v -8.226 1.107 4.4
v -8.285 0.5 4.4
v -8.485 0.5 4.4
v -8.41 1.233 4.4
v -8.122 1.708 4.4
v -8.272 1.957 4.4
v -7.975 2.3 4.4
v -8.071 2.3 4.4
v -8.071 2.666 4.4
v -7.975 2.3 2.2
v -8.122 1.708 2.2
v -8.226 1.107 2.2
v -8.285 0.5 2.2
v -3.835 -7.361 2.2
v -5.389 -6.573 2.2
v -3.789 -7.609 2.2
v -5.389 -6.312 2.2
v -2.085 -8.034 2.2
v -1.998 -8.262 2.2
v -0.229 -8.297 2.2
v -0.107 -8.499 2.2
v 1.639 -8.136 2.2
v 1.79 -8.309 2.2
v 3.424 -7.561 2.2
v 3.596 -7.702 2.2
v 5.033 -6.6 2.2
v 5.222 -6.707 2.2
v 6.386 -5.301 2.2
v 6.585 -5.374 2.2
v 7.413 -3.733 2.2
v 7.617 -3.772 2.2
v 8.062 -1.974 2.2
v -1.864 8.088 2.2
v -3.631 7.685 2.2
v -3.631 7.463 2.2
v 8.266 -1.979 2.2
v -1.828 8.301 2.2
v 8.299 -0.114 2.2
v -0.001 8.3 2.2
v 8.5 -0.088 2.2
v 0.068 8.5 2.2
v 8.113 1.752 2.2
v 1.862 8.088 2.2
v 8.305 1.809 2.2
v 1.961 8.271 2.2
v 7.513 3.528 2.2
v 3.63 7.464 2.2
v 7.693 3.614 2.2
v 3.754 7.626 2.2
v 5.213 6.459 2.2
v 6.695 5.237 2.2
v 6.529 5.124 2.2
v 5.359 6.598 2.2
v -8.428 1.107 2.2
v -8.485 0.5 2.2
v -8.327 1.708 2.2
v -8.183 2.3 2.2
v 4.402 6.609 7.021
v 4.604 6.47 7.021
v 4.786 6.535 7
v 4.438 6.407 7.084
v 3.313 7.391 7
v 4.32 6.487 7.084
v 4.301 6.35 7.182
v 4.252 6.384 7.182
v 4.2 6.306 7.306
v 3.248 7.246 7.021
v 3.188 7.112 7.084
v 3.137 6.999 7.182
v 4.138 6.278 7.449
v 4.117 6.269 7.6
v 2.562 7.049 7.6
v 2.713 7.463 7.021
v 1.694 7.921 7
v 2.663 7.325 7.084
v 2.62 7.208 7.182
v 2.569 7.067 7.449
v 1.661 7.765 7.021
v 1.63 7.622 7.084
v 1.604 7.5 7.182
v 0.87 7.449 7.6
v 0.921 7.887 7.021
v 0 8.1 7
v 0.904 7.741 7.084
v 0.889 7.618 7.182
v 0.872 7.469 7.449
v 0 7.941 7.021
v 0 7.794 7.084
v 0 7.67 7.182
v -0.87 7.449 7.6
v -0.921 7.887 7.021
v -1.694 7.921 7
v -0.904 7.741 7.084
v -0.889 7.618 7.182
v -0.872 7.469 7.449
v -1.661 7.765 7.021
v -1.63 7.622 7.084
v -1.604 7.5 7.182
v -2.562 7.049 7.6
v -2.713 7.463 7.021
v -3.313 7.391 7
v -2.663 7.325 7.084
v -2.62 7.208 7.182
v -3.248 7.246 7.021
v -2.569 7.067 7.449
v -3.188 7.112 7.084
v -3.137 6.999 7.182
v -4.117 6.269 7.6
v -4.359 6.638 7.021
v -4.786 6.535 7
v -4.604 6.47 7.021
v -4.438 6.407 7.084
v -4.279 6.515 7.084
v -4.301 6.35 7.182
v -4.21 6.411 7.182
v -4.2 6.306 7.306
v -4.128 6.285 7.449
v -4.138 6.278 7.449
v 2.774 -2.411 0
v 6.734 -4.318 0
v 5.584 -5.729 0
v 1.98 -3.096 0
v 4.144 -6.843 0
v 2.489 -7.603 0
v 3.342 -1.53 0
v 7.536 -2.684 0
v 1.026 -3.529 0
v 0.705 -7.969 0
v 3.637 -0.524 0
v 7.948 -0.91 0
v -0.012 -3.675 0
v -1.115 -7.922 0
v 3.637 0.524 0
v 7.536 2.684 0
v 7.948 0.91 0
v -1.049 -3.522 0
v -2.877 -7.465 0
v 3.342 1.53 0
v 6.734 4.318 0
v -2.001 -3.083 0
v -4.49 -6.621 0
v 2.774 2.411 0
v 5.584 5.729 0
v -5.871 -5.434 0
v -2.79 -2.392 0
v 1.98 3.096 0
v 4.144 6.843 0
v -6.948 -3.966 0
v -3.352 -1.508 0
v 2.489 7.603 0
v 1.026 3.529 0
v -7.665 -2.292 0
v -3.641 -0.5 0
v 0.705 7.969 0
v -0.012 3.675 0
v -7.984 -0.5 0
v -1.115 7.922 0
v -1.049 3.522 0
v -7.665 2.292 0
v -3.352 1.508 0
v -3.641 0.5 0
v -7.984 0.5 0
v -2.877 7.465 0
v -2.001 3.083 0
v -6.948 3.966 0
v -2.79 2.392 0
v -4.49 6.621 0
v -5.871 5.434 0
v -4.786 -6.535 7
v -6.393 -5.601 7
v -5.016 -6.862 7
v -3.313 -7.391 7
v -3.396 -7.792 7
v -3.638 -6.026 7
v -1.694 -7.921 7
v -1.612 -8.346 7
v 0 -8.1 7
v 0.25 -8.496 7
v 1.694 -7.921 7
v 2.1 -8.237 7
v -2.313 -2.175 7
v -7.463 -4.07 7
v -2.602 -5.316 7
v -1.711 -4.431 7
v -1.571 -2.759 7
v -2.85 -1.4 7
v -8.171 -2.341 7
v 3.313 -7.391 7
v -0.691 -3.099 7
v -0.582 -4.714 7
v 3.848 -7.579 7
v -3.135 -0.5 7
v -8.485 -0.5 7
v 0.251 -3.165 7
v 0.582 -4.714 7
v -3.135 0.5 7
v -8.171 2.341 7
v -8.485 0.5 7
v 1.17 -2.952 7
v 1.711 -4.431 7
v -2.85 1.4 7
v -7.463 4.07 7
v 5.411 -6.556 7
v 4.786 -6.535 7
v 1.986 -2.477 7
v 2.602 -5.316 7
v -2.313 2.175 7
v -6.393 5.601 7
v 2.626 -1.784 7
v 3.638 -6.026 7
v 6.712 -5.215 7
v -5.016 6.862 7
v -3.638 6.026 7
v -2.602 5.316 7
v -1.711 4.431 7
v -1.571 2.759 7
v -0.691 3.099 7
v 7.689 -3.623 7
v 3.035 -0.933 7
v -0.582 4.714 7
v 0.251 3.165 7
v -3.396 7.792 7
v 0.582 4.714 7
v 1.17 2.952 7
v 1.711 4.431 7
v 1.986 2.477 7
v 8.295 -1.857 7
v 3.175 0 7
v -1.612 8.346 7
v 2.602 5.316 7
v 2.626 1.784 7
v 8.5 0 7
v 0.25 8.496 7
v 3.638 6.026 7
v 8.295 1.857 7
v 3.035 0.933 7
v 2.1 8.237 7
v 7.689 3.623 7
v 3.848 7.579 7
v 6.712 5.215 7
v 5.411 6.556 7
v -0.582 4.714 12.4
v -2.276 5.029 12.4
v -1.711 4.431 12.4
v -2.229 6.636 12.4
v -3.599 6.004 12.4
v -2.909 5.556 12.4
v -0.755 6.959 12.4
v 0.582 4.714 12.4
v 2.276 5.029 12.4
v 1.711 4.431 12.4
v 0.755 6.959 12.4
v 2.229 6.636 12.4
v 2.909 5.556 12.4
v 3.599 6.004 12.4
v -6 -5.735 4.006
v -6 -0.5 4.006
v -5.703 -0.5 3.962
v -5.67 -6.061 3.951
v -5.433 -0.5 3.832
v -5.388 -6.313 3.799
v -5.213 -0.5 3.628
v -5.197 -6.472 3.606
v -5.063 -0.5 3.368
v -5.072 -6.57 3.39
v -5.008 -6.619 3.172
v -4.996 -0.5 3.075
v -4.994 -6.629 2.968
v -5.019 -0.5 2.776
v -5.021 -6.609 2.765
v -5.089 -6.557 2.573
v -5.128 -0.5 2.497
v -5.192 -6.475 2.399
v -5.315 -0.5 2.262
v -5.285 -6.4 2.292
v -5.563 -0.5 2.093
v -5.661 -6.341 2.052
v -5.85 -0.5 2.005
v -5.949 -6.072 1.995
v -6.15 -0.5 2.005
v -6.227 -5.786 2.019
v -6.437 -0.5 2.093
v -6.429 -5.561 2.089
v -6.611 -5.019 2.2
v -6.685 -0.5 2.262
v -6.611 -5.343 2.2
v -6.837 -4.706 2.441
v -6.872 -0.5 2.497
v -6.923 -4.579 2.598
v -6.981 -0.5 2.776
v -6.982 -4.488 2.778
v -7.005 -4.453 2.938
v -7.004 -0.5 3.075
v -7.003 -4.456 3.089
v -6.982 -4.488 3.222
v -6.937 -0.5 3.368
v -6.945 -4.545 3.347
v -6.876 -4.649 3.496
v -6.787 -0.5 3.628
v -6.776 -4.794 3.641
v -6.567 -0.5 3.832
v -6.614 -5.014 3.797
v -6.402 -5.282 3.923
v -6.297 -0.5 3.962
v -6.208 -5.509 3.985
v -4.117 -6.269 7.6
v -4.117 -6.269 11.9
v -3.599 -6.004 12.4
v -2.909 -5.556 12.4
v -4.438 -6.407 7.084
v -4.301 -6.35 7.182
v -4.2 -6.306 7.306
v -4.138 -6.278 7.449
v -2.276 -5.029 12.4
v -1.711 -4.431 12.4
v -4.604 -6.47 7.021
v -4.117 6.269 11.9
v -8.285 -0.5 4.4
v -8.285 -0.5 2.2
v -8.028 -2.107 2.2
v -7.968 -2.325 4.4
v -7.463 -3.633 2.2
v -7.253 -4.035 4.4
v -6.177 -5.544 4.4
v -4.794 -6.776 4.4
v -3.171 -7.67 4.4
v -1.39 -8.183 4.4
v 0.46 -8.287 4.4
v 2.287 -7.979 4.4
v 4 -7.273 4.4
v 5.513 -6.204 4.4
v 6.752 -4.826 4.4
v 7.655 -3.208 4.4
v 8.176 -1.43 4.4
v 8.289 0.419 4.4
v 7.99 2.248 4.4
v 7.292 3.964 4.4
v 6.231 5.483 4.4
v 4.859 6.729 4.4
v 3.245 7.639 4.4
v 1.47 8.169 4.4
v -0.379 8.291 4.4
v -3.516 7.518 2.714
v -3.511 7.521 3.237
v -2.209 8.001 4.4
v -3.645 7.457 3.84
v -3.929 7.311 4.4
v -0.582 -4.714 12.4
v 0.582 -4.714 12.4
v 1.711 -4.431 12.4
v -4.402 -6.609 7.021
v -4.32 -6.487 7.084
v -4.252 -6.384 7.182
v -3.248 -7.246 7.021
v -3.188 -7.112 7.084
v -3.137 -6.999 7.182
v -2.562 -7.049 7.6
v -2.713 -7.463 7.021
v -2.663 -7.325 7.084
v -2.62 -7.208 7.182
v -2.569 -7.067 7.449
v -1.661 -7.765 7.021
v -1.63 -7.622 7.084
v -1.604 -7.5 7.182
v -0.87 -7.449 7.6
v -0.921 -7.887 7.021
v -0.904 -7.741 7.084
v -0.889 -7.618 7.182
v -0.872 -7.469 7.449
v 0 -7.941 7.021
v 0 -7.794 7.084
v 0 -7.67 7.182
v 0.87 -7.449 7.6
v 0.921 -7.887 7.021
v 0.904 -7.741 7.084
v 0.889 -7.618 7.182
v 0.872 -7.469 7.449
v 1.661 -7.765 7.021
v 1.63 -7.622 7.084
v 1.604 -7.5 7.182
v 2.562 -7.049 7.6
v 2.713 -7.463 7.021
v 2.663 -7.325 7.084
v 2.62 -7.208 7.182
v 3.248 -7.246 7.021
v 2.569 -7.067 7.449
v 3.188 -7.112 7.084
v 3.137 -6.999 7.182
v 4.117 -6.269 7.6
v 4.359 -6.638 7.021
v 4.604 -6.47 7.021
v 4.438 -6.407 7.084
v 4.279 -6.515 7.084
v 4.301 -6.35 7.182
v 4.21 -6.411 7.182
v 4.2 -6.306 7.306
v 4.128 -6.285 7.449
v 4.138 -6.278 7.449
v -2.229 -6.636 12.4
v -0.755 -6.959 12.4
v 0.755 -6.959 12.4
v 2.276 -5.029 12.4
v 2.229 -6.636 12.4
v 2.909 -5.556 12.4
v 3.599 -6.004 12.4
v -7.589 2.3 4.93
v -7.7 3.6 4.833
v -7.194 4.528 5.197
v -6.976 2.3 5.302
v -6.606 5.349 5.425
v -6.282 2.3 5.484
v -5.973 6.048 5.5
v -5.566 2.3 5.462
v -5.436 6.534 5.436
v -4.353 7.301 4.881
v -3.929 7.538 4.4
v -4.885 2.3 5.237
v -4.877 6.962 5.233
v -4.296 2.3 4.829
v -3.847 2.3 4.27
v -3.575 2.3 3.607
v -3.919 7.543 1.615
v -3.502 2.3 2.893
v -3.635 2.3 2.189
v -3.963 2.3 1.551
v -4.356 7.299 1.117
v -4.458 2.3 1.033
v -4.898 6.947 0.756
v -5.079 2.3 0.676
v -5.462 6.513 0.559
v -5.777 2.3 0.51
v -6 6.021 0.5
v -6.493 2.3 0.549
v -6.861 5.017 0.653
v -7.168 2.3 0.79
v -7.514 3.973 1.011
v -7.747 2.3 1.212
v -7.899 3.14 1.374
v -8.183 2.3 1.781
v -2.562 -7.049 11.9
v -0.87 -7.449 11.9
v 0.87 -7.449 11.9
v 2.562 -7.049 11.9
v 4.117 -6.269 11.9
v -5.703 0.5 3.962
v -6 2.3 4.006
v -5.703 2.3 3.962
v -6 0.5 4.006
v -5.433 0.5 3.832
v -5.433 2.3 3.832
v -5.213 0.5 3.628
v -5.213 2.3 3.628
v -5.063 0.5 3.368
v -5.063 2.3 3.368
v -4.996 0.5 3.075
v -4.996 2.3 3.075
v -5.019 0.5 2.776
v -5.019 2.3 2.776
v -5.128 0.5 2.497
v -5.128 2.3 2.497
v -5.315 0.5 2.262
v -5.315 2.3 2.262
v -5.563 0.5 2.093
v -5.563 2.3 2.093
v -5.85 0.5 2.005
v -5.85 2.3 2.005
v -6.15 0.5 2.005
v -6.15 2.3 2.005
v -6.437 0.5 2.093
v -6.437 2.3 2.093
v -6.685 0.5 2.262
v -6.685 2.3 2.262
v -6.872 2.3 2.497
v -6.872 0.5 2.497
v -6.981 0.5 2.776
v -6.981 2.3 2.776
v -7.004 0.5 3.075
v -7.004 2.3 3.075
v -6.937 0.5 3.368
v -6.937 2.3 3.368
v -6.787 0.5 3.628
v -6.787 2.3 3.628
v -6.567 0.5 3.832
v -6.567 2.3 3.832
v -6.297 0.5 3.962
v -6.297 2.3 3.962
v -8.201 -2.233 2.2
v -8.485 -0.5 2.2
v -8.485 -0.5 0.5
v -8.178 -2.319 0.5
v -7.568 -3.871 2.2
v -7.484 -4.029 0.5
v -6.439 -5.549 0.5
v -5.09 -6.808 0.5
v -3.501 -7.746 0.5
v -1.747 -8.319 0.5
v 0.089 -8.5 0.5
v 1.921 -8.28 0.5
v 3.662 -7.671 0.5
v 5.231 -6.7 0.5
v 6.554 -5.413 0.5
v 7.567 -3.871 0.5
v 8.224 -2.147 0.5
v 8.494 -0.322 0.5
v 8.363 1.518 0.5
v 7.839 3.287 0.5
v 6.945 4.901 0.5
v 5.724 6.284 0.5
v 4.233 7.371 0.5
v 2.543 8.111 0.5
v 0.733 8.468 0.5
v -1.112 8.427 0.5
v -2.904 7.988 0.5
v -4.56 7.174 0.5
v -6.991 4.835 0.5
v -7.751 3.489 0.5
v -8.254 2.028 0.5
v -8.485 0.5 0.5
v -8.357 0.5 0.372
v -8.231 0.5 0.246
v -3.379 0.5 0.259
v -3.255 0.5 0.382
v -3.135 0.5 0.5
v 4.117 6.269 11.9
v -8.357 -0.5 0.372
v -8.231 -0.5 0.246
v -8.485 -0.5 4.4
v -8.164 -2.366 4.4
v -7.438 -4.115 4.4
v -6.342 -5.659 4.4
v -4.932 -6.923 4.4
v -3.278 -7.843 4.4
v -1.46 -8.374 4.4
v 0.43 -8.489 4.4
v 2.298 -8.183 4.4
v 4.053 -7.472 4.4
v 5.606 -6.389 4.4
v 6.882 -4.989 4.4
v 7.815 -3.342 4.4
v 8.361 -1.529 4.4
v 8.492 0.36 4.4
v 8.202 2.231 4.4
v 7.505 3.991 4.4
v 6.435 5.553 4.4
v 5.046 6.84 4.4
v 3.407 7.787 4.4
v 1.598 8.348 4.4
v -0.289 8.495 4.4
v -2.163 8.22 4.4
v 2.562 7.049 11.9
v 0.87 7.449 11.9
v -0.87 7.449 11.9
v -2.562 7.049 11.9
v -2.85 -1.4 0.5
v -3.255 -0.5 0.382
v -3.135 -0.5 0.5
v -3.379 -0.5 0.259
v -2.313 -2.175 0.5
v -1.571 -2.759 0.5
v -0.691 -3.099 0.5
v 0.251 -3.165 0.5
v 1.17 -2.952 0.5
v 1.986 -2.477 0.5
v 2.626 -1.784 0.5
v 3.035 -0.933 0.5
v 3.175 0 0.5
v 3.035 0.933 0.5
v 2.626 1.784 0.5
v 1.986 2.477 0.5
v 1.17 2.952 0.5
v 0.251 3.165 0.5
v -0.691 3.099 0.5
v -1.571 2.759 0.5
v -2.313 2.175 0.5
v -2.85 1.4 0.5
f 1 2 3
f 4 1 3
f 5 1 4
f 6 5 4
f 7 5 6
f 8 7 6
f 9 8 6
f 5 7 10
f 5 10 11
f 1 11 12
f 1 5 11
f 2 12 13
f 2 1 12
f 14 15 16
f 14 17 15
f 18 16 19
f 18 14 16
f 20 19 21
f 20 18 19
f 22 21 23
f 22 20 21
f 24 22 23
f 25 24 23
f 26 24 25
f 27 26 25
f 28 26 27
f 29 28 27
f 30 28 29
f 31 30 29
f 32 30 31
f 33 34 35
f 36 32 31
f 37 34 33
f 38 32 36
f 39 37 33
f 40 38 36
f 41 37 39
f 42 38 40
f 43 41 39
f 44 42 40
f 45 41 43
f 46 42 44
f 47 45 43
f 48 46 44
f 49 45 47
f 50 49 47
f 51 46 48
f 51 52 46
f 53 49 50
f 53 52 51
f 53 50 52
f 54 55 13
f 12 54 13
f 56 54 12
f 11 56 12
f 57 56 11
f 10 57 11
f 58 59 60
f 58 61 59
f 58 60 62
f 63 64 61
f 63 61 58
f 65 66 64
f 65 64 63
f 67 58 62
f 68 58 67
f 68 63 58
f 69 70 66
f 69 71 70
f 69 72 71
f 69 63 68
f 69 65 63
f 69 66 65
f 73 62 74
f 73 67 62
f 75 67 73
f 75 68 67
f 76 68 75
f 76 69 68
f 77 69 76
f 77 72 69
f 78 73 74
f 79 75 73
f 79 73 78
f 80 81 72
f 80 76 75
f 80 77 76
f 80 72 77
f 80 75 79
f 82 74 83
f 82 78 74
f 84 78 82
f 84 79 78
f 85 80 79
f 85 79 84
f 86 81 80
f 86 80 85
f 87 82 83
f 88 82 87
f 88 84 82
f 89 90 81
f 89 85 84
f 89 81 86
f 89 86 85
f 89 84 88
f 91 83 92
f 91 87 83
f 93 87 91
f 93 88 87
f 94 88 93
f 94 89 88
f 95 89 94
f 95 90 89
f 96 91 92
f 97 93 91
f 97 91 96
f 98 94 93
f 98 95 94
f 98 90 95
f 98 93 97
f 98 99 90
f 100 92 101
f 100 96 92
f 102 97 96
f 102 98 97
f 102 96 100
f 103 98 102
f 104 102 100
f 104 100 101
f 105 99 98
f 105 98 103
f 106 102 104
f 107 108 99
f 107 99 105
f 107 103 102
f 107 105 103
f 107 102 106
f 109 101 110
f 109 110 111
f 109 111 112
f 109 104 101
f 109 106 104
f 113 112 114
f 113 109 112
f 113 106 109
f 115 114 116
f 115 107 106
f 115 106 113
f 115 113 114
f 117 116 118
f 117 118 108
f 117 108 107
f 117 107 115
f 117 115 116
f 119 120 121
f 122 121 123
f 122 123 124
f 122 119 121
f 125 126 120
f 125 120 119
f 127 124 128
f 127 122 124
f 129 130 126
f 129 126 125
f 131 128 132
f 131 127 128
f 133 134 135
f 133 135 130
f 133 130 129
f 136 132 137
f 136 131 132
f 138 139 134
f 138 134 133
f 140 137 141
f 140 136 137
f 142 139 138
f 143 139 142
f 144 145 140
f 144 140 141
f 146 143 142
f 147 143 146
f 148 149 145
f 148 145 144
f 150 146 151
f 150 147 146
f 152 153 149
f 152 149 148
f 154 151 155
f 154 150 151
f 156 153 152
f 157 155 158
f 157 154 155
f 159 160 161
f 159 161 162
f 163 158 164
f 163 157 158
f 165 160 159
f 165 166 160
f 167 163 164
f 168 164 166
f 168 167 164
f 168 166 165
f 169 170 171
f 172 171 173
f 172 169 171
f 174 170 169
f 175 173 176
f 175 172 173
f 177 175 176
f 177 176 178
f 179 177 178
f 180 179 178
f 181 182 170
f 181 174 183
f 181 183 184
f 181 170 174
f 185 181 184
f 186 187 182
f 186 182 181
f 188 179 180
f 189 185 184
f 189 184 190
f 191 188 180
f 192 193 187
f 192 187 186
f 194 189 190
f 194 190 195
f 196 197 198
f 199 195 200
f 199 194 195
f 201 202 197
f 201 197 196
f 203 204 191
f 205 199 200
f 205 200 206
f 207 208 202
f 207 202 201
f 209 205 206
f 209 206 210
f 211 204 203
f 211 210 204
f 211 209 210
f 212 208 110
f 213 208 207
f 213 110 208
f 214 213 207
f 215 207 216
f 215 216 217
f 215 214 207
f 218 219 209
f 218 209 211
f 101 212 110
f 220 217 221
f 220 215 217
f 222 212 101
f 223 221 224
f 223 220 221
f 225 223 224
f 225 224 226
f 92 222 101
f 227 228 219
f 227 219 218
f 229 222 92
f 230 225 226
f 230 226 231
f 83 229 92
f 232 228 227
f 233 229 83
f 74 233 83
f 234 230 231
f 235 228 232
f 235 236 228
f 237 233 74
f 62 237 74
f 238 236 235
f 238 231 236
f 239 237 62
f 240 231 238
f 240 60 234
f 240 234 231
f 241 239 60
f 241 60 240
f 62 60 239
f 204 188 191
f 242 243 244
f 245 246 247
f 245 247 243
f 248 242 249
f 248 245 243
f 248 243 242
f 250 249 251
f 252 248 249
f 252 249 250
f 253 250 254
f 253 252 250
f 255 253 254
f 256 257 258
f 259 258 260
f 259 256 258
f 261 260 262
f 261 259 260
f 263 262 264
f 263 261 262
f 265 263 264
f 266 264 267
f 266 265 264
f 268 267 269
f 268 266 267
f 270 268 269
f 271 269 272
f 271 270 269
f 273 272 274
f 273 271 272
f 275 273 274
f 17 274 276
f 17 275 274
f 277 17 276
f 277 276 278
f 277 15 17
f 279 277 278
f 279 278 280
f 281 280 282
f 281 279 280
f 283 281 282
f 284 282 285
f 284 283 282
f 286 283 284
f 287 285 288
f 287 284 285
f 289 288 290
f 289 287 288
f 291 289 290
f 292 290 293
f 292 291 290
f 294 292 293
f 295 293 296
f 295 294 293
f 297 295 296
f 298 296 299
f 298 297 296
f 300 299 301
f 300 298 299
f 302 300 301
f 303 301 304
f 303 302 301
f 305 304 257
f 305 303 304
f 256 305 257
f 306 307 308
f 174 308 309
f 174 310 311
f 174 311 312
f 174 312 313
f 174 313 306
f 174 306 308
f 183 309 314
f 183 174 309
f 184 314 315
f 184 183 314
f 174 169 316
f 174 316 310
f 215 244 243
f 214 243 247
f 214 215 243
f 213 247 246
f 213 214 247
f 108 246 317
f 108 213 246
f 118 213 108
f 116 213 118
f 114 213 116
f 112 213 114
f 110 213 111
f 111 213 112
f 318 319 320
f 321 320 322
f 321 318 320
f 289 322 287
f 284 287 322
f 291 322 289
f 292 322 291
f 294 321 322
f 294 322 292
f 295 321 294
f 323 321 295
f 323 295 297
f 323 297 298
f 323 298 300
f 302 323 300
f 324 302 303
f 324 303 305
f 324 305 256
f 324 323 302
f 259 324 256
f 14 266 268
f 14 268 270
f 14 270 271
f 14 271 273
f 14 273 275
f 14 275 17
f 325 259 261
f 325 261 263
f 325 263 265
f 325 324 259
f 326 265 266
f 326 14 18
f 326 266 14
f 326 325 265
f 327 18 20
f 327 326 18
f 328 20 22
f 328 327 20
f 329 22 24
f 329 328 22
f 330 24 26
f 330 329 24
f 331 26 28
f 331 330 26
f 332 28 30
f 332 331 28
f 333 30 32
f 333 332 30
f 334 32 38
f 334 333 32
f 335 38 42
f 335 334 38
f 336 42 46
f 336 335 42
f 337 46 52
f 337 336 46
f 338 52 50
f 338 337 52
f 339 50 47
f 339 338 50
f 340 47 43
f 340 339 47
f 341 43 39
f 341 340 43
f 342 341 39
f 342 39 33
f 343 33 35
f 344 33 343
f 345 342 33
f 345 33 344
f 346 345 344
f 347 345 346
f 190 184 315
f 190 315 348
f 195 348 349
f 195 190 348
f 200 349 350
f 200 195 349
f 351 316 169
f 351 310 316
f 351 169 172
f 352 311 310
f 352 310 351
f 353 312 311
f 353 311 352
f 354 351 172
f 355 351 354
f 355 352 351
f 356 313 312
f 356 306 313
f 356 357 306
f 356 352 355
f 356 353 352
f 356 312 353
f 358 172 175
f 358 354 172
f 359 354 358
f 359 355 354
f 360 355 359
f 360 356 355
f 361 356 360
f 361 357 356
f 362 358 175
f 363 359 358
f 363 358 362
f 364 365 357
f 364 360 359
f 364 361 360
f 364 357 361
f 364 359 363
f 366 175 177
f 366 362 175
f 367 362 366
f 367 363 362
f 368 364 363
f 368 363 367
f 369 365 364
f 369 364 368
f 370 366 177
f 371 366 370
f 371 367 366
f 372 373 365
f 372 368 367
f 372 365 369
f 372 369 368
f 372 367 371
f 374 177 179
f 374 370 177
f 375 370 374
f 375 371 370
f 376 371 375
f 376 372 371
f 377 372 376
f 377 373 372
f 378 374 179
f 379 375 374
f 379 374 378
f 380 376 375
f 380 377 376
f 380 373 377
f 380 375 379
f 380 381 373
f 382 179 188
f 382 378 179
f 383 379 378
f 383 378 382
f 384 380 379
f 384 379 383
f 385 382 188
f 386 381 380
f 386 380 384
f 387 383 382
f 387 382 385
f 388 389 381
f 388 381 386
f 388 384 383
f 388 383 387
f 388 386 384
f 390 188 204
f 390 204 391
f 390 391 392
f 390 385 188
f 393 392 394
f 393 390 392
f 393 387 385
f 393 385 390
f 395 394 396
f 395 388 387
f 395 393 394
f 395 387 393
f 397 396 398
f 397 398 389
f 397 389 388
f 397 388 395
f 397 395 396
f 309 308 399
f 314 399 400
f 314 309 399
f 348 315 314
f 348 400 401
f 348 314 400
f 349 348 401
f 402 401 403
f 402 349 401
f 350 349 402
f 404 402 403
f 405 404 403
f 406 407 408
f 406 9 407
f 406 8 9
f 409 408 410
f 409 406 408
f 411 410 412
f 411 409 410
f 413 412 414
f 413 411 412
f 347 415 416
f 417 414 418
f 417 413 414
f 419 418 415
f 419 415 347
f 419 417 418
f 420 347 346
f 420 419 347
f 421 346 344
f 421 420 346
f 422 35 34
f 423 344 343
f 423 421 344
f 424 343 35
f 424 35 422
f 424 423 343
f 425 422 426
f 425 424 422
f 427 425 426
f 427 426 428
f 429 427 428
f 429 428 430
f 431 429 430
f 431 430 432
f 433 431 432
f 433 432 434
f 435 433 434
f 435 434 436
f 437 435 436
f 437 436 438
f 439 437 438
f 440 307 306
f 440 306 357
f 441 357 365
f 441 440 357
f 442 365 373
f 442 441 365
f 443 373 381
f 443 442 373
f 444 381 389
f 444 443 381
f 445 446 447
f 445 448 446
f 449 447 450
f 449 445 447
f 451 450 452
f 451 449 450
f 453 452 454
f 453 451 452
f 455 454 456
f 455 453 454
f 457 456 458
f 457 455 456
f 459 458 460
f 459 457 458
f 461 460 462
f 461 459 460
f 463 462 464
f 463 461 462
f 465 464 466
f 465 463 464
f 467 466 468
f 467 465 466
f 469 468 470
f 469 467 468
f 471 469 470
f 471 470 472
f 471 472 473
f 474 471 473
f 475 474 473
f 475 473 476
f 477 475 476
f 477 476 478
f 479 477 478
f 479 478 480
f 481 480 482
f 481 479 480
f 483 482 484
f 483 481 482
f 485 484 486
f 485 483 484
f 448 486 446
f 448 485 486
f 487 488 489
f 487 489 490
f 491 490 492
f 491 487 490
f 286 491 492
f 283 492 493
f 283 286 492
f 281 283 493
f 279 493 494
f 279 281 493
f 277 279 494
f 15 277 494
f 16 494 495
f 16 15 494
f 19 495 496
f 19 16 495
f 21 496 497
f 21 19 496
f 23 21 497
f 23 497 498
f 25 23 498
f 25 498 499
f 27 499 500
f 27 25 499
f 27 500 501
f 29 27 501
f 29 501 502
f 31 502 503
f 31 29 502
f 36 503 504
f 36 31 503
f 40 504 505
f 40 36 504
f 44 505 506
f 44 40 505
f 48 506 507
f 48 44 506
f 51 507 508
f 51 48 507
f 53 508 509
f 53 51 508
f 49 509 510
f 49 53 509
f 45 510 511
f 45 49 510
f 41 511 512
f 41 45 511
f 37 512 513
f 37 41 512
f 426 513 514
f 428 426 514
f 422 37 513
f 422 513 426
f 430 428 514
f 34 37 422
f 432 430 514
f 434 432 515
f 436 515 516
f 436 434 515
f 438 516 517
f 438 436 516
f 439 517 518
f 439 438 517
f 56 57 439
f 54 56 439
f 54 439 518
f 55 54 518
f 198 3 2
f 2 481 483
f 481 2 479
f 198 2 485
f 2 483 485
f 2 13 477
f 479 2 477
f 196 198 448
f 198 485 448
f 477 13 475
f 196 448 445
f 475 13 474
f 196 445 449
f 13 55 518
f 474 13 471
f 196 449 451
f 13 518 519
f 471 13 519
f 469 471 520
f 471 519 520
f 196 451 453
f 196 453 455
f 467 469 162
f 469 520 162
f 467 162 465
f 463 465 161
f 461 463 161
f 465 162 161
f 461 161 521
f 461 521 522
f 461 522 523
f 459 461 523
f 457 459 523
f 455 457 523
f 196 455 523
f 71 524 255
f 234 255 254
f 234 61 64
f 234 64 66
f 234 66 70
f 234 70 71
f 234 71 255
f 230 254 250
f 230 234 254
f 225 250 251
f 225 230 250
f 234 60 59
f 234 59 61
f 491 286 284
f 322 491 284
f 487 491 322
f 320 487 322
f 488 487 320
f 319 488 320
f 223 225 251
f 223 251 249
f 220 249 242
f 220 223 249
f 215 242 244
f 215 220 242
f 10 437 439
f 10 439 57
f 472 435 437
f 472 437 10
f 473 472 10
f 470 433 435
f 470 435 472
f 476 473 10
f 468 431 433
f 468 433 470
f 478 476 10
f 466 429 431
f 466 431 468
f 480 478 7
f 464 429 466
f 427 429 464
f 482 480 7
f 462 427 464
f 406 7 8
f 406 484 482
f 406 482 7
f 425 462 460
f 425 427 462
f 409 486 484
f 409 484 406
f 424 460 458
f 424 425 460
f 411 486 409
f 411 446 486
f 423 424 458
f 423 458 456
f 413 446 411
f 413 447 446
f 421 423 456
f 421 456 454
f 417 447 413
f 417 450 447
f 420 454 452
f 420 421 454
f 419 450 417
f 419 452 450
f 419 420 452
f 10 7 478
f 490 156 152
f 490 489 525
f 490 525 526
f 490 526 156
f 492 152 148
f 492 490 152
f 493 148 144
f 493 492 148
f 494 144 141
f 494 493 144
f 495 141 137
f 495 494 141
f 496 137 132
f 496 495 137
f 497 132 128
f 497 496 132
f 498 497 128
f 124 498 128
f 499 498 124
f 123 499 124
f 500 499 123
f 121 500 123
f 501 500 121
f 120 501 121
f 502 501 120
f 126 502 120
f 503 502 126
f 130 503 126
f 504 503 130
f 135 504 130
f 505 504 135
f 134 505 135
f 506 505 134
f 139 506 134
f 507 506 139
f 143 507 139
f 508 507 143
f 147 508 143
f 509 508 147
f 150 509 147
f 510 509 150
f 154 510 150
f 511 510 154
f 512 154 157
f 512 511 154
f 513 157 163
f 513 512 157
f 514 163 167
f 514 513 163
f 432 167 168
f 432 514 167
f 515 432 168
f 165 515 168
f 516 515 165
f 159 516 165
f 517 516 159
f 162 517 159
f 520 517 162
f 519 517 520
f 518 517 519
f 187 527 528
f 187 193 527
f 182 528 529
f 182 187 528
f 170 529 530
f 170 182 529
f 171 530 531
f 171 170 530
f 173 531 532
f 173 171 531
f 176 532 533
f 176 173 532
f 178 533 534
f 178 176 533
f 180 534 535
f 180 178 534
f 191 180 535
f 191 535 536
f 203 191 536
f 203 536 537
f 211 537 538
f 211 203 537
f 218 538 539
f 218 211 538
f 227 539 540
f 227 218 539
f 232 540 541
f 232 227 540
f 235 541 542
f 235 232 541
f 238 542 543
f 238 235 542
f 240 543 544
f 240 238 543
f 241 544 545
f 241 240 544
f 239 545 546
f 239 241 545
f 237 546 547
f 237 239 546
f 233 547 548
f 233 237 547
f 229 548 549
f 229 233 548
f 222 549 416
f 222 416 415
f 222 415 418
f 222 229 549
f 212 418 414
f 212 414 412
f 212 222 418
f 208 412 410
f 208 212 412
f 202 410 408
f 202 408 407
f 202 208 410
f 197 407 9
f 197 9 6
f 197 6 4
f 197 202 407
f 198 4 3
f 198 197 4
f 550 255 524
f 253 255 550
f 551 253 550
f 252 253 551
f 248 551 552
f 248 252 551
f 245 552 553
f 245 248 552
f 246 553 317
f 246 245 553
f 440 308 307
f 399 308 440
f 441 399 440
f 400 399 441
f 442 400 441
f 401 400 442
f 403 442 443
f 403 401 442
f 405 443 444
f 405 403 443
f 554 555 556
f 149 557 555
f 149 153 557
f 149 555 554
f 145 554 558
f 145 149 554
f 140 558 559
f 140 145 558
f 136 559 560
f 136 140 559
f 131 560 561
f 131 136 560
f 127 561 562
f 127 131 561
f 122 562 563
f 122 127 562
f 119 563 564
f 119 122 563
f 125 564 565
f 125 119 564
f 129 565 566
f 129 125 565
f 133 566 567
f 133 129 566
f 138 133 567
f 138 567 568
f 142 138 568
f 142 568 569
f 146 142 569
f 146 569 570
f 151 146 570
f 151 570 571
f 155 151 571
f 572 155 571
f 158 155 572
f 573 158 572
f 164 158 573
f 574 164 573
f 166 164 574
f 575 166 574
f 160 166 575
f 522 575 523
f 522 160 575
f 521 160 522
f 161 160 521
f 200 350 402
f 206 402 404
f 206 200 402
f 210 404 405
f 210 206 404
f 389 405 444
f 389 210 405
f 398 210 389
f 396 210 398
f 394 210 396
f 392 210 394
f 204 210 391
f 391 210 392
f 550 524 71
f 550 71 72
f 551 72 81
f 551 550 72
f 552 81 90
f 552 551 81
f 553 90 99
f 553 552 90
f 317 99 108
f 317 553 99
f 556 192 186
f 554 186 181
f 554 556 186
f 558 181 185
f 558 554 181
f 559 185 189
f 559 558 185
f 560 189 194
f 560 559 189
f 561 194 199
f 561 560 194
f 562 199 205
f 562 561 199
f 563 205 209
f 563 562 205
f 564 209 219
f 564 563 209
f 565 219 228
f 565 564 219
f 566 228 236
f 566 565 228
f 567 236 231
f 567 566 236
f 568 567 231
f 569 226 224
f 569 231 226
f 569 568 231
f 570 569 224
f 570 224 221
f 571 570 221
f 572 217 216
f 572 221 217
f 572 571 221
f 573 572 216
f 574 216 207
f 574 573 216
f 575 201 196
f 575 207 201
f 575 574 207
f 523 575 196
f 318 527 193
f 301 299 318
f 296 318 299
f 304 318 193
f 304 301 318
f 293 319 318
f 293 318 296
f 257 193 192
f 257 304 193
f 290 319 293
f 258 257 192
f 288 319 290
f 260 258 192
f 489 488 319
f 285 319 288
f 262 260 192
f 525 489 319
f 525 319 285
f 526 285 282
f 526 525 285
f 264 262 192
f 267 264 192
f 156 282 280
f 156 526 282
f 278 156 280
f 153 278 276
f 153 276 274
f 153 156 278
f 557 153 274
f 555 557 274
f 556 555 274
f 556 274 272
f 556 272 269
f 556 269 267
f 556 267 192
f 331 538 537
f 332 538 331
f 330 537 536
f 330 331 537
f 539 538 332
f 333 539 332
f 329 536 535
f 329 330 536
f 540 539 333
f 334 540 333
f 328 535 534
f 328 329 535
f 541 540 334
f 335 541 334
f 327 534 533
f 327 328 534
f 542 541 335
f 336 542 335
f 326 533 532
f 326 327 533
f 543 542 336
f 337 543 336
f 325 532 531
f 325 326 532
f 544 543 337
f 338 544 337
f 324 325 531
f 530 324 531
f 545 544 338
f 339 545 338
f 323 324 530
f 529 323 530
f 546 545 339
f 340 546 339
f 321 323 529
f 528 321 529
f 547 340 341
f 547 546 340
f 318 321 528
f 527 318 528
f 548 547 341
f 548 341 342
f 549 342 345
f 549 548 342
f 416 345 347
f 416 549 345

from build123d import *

# Parameters (mm, degrees)
SKETCH3_W          = 8.5
SKETCH3_H          = 1
CUT_EXTRUDE1_DEPTH = 12.4
CUT_EXTRUDE2_DEPTH = 12.4


with BuildPart() as part:
    # Sketch1 → Revolve1 (revolve)
    with BuildSketch(Plane(origin=(0, 0, 0), x_dir=(0, 0, -1), z_dir=(1, 0, 0))):
        with BuildLine():
            Line((-12.4, 7), (-12.4, 3.675))
            Line((-12.4, 3.675), (-11.9, 3.175))
            Line((-11.9, 3.175), (-0.5, 3.175))
            Line((-0.5, 3.175), (0, 3.675))
            Line((0, 3.675), (0, 8))
            Line((0, 8), (-0.5, 8.5))
            Line((-0.5, 8.5), (-2.2, 8.5))
            Line((-2.2, 8.5), (-2.2, 8.3))
            Line((-2.2, 8.3), (-4.4, 8.3))
            Line((-4.4, 8.3), (-4.4, 8.5))
            Line((-4.4, 8.5), (-7, 8.5))
            Line((-7, 8.5), (-7, 8.1))
            ThreePointArc((-7, 8.1), (-7.175735931, 7.675735931), (-7.6, 7.5))
            Line((-7.6, 7.5), (-11.9, 7.5))
            Line((-11.9, 7.5), (-12.4, 7))
        make_face()
    revolve(axis=Axis((0, 0, 0), (0, 0, 1)))

    # Sketch2 → Cut-Revolve1 (revolve, cut)
    with BuildSketch(Plane.XY.offset(3)):
        Polygon((-6, 8.5), (-3.5, 8.5), (-3.5, 2.3), (-4.9935, 2.3), (-4.9935, -8.5), (-6, -8.5), align=None)
    revolve(axis=Axis((-6, -8.5, 3), (0, 1, 0)), mode=Mode.SUBTRACT)

    # Sketch3 → Cut-Extrude1 (cut)
    with BuildSketch(Plane.XY):
        with Locations((-4.25, 0)):
            Rectangle(SKETCH3_W, SKETCH3_H)
    extrude(amount=CUT_EXTRUDE1_DEPTH, mode=Mode.SUBTRACT)

    # Sketch4 → Cut-Extrude2 (cut)
    with BuildSketch(Plane.XY.offset(7)):
        with BuildLine():
            ThreePointArc((-1.710892857, 4.431178808), (-13.9, 0), (-1.710892857, -4.431178808))
            ThreePointArc((-1.710892857, -4.431178808), (0, -4.75), (1.710892857, -4.431178808))
            ThreePointArc((1.710892857, -4.431178808), (13.9, 0), (1.710892857, 4.431178808))
            ThreePointArc((1.710892857, 4.431178808), (0, 4.75), (-1.710892857, 4.431178808))
        make_face()
    extrude(amount=CUT_EXTRUDE2_DEPTH, mode=Mode.SUBTRACT)


solid = part.part
